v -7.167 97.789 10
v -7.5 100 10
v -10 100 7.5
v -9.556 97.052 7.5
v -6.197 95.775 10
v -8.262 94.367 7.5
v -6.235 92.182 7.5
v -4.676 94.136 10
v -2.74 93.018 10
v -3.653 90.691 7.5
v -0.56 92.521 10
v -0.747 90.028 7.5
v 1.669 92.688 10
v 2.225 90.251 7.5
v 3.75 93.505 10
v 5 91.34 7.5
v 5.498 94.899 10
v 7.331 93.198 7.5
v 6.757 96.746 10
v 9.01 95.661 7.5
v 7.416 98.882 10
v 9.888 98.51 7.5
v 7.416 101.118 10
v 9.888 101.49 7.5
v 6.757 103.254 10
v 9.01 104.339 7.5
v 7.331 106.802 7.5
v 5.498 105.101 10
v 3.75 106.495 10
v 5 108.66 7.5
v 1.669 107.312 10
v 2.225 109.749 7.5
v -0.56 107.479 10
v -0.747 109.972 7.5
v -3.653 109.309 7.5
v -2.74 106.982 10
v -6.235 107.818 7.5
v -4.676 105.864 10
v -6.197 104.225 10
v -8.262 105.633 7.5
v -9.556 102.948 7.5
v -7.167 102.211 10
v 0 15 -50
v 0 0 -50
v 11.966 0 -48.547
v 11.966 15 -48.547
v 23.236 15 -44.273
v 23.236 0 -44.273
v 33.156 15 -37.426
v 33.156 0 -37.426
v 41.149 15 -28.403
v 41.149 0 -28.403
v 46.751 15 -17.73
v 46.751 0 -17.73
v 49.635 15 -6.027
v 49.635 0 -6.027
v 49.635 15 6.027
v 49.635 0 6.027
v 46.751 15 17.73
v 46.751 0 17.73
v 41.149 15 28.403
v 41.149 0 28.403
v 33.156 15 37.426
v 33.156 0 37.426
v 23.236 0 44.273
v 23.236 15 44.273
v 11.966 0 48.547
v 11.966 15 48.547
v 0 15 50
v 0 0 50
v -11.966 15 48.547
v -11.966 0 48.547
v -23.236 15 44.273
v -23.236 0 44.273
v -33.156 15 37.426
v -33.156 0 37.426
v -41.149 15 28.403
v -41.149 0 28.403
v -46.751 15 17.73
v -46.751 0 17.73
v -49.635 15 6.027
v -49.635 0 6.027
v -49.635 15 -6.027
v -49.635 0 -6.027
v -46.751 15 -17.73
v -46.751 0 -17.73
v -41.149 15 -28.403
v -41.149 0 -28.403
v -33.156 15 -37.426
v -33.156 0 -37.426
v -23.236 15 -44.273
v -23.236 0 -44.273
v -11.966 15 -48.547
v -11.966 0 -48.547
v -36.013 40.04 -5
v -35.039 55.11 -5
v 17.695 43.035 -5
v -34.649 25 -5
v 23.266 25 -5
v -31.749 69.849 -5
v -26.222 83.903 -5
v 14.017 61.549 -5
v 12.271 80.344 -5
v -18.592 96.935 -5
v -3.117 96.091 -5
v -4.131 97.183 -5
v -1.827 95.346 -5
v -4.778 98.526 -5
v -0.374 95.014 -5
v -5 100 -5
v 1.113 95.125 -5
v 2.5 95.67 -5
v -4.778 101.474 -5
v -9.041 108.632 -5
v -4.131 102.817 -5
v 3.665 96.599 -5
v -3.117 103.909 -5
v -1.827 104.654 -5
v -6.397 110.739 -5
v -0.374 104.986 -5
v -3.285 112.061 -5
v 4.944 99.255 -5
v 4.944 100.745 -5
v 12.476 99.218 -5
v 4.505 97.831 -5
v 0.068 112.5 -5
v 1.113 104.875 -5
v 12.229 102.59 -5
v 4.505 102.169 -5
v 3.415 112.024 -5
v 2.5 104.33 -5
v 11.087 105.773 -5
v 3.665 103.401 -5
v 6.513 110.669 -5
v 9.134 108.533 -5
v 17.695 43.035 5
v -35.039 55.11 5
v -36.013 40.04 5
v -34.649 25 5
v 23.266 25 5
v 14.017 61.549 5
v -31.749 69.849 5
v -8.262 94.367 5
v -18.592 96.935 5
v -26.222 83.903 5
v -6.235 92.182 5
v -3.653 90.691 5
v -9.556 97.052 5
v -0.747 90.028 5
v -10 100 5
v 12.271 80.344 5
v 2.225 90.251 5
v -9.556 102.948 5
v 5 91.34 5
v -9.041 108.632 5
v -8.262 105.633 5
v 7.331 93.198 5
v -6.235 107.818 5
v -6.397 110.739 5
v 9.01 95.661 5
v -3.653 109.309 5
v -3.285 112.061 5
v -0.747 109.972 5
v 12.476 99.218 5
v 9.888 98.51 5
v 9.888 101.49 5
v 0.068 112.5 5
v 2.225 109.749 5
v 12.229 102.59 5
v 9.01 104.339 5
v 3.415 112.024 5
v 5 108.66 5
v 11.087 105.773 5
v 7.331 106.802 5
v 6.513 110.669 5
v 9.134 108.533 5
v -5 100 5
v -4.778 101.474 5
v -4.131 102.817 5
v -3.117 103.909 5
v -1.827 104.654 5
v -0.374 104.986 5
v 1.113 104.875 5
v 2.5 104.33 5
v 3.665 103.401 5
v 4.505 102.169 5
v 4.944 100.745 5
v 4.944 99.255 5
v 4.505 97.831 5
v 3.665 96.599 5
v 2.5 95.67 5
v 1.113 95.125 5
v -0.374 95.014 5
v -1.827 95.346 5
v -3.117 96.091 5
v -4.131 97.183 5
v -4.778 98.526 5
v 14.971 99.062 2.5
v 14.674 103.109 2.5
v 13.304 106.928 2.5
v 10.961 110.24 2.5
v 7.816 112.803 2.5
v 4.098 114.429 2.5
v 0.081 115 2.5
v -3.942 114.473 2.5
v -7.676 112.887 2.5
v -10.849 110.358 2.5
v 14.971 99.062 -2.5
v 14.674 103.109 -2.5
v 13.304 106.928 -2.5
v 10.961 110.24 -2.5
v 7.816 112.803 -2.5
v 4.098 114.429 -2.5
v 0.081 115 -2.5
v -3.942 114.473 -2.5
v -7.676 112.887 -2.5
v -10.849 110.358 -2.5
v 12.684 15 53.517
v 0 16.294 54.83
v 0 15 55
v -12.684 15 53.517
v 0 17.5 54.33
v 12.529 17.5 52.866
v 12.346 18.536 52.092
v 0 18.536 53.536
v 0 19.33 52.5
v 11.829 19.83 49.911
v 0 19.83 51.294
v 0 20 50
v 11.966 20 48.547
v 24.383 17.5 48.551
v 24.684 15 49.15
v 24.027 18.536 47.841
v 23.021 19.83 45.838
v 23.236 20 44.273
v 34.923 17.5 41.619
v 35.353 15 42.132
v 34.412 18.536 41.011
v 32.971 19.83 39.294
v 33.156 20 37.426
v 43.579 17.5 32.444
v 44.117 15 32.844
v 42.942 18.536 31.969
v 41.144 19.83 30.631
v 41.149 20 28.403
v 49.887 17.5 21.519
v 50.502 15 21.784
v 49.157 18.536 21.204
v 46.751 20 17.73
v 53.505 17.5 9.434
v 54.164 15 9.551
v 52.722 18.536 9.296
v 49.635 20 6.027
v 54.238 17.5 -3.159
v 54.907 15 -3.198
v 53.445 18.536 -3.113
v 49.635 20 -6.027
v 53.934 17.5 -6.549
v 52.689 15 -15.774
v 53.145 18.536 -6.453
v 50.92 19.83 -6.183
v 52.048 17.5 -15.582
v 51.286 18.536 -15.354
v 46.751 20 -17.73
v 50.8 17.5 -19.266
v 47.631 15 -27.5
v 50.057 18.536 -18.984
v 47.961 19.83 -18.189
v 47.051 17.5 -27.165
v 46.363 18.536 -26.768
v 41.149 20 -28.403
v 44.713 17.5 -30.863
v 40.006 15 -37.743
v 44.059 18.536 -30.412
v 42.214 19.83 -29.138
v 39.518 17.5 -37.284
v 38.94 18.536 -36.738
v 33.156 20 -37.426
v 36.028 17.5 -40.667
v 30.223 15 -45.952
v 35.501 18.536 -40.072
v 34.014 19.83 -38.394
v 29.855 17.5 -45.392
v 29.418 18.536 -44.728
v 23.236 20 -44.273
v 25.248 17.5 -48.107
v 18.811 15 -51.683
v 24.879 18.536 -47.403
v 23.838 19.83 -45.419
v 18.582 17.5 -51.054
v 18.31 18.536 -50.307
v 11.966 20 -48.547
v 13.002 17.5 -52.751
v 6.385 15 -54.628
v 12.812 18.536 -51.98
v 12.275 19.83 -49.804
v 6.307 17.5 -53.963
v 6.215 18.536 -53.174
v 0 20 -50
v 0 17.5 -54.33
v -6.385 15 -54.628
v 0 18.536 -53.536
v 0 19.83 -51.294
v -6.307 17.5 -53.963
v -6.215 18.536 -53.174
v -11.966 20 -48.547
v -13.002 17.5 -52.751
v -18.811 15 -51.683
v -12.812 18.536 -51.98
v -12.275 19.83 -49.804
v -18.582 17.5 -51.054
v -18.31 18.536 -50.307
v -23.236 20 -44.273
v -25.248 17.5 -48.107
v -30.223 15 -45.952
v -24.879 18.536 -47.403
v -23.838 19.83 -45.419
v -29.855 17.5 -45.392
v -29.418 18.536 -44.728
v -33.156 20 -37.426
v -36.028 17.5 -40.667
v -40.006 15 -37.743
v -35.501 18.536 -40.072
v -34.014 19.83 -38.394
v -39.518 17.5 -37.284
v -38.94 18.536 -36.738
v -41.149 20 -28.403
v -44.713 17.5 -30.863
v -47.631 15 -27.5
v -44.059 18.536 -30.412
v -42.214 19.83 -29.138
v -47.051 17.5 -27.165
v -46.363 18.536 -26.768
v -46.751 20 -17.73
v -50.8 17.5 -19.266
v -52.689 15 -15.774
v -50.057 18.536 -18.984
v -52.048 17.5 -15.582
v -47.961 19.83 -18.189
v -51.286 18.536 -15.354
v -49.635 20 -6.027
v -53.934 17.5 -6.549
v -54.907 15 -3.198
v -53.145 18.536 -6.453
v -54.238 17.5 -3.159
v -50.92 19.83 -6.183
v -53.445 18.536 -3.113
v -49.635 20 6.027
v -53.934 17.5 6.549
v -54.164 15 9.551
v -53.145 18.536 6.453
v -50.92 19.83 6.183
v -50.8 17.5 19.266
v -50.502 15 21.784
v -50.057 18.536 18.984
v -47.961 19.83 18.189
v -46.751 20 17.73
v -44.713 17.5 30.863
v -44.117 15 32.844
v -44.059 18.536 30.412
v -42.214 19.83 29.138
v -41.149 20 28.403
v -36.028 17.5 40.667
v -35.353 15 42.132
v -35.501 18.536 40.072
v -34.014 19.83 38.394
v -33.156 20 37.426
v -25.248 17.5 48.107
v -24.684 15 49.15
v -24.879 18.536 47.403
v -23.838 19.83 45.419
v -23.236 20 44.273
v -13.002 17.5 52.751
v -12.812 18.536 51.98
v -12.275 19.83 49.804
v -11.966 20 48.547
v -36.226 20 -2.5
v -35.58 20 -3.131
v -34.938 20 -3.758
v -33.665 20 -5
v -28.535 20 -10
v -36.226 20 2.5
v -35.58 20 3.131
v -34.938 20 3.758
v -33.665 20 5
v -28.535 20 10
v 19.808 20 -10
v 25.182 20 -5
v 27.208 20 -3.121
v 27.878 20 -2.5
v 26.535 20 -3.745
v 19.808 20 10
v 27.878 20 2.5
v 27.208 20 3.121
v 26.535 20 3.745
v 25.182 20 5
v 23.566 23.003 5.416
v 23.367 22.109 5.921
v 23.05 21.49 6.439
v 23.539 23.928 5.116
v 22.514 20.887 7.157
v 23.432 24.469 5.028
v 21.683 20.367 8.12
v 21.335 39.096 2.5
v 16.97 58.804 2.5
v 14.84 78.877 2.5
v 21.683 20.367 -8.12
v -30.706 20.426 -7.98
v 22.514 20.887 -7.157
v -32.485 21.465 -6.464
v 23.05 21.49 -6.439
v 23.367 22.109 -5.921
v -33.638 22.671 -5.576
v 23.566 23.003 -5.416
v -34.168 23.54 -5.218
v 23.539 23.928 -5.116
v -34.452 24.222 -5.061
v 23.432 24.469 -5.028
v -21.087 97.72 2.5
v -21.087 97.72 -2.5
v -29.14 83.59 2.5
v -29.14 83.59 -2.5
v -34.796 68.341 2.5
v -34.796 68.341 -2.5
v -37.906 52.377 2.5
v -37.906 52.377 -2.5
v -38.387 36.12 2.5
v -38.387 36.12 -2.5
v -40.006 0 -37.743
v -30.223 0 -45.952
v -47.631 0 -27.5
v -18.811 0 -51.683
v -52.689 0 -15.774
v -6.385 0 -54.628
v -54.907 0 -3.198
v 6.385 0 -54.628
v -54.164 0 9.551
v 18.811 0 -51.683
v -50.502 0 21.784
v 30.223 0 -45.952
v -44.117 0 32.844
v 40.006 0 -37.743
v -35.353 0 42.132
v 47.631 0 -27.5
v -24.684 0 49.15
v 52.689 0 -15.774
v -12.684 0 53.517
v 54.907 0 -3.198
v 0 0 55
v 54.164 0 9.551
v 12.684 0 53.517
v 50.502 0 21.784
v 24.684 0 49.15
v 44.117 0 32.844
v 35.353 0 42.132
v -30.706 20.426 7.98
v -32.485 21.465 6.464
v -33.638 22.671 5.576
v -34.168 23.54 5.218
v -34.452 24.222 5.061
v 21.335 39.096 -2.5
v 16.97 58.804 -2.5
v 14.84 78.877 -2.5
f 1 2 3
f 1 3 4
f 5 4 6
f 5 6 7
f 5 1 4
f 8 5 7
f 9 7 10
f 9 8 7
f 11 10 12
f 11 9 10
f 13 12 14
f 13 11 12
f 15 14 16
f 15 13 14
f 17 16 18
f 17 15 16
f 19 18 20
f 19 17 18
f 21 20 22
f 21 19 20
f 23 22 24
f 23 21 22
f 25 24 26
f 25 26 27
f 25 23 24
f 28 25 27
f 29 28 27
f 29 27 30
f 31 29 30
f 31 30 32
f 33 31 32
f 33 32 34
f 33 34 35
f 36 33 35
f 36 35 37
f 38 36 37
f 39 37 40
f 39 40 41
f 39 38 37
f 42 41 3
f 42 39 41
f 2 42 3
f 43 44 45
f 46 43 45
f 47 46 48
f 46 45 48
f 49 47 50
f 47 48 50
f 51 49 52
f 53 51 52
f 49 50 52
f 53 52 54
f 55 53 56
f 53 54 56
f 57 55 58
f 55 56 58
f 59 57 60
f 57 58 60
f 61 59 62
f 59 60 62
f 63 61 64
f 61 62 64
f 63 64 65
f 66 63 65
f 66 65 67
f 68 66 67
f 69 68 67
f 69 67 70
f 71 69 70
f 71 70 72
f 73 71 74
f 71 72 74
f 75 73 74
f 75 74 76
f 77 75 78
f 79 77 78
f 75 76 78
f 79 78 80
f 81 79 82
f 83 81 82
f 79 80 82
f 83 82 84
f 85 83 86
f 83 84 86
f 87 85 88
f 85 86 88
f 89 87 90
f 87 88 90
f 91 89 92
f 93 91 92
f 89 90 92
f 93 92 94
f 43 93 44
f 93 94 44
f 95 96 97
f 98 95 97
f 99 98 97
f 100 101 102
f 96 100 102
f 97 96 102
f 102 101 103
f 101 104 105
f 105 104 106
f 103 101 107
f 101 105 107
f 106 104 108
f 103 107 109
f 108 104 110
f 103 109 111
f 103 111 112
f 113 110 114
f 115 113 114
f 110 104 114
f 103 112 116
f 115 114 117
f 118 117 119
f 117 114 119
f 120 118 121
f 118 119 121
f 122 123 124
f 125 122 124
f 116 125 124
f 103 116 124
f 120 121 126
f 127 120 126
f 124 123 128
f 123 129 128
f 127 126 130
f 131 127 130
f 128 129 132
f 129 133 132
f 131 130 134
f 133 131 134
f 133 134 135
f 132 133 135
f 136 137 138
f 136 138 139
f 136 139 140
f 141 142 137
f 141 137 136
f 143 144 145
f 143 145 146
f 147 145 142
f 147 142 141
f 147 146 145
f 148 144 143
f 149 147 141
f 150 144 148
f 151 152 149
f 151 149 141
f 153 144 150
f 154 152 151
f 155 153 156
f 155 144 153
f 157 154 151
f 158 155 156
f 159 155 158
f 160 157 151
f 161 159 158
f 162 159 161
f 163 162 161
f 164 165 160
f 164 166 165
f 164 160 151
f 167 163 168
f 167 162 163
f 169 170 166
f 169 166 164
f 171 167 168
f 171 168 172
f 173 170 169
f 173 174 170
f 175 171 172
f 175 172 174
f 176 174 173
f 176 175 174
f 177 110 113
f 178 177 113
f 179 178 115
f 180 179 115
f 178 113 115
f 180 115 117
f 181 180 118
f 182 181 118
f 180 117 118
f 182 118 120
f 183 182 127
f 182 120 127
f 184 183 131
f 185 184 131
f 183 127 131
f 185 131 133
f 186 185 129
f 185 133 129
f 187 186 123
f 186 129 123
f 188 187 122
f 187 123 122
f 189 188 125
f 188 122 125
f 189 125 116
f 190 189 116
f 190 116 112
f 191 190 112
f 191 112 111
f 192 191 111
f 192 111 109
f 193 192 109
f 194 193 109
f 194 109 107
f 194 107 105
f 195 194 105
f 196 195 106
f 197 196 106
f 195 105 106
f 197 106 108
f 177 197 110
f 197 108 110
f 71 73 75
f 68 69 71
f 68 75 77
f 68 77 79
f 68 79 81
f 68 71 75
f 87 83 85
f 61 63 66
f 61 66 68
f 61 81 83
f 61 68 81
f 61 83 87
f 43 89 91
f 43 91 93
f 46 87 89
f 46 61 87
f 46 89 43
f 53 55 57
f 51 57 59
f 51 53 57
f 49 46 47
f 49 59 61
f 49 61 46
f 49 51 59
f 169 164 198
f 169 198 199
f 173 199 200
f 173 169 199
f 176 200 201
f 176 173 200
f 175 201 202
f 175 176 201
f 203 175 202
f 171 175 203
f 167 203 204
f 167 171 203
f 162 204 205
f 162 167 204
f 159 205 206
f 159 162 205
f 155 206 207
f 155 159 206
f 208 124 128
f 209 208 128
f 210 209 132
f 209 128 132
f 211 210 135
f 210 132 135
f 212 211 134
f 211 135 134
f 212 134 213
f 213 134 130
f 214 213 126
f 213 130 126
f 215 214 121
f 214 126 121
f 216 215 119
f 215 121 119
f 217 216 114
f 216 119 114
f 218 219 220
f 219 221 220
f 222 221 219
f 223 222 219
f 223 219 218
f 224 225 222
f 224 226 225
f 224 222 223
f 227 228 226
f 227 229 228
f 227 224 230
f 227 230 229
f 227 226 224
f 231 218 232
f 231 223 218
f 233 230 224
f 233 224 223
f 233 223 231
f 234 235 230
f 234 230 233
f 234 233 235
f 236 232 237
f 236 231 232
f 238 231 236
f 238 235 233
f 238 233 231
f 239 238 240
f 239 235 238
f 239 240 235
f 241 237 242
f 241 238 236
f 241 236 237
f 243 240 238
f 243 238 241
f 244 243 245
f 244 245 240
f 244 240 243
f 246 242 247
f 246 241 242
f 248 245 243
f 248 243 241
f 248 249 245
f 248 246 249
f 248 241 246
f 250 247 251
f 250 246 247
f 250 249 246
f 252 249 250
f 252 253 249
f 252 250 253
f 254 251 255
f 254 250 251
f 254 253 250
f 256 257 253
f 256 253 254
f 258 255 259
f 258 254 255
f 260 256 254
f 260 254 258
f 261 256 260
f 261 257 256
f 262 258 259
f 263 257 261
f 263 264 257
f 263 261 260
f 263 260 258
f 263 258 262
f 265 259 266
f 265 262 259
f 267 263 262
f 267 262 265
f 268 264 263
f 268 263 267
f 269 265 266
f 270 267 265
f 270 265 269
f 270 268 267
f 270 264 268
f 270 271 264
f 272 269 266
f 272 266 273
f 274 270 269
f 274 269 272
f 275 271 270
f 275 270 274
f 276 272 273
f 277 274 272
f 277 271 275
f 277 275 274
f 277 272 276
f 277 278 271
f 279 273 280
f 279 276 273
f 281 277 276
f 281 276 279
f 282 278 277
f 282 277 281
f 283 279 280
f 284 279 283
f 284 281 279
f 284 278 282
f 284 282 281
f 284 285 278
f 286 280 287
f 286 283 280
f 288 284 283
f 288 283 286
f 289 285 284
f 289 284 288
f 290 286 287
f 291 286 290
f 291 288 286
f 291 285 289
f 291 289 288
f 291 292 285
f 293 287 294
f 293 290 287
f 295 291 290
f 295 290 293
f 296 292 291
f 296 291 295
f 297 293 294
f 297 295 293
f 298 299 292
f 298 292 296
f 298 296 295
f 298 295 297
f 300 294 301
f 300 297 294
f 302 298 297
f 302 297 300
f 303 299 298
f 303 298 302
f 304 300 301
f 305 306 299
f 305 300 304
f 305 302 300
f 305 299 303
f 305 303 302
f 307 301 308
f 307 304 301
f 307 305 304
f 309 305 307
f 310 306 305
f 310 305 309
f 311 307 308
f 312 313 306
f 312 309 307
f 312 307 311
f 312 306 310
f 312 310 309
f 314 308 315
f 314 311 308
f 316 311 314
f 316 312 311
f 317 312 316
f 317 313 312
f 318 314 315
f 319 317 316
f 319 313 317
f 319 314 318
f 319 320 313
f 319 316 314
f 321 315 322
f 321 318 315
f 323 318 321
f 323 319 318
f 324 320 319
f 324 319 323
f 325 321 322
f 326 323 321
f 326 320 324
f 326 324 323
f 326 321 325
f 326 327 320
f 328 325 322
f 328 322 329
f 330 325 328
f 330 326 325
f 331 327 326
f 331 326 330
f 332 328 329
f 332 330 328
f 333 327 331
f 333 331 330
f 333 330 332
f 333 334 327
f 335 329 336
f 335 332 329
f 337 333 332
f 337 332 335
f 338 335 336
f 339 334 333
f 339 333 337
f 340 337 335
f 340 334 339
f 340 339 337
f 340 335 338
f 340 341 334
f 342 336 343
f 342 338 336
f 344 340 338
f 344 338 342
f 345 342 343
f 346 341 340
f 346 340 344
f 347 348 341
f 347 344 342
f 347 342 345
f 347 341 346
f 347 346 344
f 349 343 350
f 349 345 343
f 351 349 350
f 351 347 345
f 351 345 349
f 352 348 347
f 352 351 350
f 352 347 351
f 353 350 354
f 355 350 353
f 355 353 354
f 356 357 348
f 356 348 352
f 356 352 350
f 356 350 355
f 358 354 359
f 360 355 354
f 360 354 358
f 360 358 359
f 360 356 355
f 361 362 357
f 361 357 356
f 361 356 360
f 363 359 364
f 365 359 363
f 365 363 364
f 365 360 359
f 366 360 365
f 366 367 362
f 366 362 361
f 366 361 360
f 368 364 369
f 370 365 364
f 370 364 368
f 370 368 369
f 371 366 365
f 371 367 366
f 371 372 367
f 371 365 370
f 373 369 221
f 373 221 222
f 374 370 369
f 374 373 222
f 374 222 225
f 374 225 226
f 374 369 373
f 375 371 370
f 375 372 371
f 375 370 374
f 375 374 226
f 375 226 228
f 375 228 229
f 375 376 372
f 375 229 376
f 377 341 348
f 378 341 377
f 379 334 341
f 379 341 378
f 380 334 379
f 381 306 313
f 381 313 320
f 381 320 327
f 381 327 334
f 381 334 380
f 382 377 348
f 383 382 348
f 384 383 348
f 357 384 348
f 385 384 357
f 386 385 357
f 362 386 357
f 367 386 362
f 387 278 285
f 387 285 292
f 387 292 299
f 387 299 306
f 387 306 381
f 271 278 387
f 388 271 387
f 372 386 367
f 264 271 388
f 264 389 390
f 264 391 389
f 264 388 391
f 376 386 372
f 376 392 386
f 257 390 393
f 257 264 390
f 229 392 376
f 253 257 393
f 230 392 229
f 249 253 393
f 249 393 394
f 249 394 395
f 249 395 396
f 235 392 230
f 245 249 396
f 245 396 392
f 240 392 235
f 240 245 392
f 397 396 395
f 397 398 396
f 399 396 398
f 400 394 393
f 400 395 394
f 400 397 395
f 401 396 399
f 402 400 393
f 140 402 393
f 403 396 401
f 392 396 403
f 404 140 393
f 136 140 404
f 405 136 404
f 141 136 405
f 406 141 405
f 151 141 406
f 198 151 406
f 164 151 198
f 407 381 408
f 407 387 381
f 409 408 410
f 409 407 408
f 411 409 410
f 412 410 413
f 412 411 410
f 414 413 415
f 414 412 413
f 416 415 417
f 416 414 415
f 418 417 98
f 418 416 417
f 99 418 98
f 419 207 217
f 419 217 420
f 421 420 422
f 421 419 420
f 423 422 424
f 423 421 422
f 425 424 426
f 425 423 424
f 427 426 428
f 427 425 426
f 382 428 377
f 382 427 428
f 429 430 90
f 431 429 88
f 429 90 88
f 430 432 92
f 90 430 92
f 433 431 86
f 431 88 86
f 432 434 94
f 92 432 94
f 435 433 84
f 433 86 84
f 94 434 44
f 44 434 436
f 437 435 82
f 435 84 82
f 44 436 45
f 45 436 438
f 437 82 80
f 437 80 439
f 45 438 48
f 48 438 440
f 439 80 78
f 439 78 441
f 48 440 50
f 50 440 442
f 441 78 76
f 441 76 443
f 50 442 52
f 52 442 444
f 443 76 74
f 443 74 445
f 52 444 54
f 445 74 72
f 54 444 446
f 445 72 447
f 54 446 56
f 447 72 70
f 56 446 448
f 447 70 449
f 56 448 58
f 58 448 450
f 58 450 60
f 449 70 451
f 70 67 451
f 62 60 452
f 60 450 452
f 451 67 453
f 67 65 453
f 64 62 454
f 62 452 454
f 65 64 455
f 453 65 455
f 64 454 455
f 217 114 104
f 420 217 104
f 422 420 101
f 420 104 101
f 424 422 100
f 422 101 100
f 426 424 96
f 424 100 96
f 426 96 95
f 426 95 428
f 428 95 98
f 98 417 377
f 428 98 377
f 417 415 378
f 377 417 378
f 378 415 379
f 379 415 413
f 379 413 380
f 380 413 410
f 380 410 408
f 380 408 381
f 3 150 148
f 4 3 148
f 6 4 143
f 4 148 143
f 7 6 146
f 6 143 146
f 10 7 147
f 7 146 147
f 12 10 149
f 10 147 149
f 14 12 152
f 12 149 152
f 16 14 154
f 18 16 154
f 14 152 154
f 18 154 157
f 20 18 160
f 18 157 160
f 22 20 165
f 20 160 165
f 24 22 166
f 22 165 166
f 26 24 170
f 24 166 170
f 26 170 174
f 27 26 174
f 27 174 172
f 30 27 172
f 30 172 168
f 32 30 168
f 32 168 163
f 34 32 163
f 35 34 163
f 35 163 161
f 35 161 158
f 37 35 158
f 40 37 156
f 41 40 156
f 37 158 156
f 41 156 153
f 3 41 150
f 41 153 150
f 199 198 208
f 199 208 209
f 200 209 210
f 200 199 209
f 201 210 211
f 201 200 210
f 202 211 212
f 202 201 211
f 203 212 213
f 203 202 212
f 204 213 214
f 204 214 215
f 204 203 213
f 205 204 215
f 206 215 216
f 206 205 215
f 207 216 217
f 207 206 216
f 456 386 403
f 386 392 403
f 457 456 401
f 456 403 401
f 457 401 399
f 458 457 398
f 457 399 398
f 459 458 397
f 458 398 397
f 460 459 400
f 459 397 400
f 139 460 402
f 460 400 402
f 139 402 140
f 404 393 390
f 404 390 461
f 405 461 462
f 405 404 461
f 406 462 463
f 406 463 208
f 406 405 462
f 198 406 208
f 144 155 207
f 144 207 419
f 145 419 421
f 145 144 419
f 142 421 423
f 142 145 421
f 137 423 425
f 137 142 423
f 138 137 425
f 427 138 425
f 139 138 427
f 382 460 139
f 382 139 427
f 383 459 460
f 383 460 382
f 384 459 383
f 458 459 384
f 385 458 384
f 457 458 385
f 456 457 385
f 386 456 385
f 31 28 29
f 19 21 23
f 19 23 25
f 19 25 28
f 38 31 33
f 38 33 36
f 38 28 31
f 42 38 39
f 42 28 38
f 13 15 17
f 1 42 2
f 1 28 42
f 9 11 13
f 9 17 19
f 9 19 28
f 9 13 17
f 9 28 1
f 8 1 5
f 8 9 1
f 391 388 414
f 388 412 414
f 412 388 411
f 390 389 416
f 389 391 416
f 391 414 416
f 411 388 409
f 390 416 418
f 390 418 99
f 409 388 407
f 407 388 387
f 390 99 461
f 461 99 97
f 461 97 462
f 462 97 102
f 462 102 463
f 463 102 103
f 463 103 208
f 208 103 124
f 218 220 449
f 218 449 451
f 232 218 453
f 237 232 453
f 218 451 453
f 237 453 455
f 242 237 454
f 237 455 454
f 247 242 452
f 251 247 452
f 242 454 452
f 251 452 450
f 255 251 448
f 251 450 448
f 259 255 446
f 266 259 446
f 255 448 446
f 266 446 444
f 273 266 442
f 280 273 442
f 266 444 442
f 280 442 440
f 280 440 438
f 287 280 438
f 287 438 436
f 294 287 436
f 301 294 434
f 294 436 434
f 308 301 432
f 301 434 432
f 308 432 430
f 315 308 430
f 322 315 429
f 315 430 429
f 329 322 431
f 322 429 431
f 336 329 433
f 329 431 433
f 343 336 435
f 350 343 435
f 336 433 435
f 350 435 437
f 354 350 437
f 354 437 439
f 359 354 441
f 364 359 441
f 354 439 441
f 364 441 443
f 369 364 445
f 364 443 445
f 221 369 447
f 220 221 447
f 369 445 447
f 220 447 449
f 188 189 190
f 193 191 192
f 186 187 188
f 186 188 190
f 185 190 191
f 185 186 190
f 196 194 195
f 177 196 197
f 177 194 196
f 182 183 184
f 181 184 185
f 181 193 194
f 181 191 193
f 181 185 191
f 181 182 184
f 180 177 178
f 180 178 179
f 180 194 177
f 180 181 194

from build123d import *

# Parameters (mm, degrees)
SKETCH2_R           = 55
BOSS_EXTRUDE1_DEPTH = 20
FILLET1_R           = 5
BOSS_EXTRUDE2_DEPTH = 5
CHAMFER1_SIZE       = 2.5
CHAMFER2_SIZE       = 2.5
FILLET2_R           = 5
SKETCH4_R           = 10
BOSS_EXTRUDE3_DEPTH = 5
CHAMFER3_SIZE       = 2.5
SKETCH5_R           = 5
CUT_EXTRUDE1_DEPTH  = 10
SKETCH8_R           = 50
CUT_EXTRUDE2_DEPTH  = 15


with BuildPart() as part:
    # Sketch2 → Boss-Extrude1 (new body)
    with BuildSketch(Plane(origin=(0, 0, 0), x_dir=(1, 0, 0), z_dir=(0, 1, 0))):
        with Locations(Location((0, 0, 0), (0, 0, 270))):
            Circle(SKETCH2_R)
    extrude(amount=BOSS_EXTRUDE1_DEPTH)

    # Fillet1
    fillet1_edges = [part.edges().sort_by_distance(p)[0] for p in [
        (0, 20, -55),
    ]]
    fillet(fillet1_edges, radius=FILLET1_R)

    # Sketch3 → Boss-Extrude2 (add, symmetric)
    with BuildSketch(Plane.XY):
        with BuildLine():
            Line((-35, 15), (30, 15))
            ThreePointArc((30, 15), (17.428098582, 56.126843631), (14.970645506, 99.06203778))
            ThreePointArc((14.970645506, 99.06203778), (6.012327577, 113.742340307), (-10.849201429, 110.358321696))
            ThreePointArc((-10.849201429, 110.358321696), (-35.460543036, 65.854059614), (-35, 15))
        make_face()
    extrude(amount=BOSS_EXTRUDE2_DEPTH, both=True)

    # Chamfer1
    chamfer1_edges = [part.edges().sort_by_distance(p)[0] for p in [
        (16.970295051, 58.803839559, 5),
        (6.012327577, 113.742340307, 5),
        (-34.796467261, 68.341174934, 5),
    ]]
    chamfer(chamfer1_edges, length=CHAMFER1_SIZE)

    # Chamfer2
    chamfer2_edges = [part.edges().sort_by_distance(p)[0] for p in [
        (-34.796467261, 68.341174934, -5),
        (16.970295051, 58.803839559, -5),
        (6.012327577, 113.742340307, -5),
    ]]
    chamfer(chamfer2_edges, length=CHAMFER2_SIZE)

    # Fillet2
    fillet2_edges = [part.edges().sort_by_distance(p)[0] for p in [
        (-4.241511046, 20, 5),
        (-4.241511046, 20, -5),
    ]]
    fillet(fillet2_edges, radius=FILLET2_R)

    # Sketch4 → Boss-Extrude3 (add)
    with BuildSketch(Plane.XY.offset(5)):
        with Locations(Location((0, 100, 0), (0, 0, 180))):
            Circle(SKETCH4_R)
    extrude(amount=BOSS_EXTRUDE3_DEPTH)

    # Chamfer3
    chamfer3_edges = [part.edges().sort_by_distance(p)[0] for p in [
        (10, 100, 10),
    ]]
    chamfer(chamfer3_edges, length=CHAMFER3_SIZE)

    # Sketch5 → Cut-Extrude1 (cut)
    with BuildSketch(Plane(origin=(0, 0, -5), x_dir=(-1, 0, 0), z_dir=(0, 0, -1))):
        with Locations((0, 100)):
            Circle(SKETCH5_R)
    extrude(amount=-CUT_EXTRUDE1_DEPTH, mode=Mode.SUBTRACT)

    # Sketch8 → Cut-Extrude2 (cut)
    with BuildSketch(Plane.XZ):
        with Locations(Location((0, 0, 0), (0, 0, 270))):
            Circle(SKETCH8_R)
    extrude(amount=-CUT_EXTRUDE2_DEPTH, mode=Mode.SUBTRACT)


solid = part.part
